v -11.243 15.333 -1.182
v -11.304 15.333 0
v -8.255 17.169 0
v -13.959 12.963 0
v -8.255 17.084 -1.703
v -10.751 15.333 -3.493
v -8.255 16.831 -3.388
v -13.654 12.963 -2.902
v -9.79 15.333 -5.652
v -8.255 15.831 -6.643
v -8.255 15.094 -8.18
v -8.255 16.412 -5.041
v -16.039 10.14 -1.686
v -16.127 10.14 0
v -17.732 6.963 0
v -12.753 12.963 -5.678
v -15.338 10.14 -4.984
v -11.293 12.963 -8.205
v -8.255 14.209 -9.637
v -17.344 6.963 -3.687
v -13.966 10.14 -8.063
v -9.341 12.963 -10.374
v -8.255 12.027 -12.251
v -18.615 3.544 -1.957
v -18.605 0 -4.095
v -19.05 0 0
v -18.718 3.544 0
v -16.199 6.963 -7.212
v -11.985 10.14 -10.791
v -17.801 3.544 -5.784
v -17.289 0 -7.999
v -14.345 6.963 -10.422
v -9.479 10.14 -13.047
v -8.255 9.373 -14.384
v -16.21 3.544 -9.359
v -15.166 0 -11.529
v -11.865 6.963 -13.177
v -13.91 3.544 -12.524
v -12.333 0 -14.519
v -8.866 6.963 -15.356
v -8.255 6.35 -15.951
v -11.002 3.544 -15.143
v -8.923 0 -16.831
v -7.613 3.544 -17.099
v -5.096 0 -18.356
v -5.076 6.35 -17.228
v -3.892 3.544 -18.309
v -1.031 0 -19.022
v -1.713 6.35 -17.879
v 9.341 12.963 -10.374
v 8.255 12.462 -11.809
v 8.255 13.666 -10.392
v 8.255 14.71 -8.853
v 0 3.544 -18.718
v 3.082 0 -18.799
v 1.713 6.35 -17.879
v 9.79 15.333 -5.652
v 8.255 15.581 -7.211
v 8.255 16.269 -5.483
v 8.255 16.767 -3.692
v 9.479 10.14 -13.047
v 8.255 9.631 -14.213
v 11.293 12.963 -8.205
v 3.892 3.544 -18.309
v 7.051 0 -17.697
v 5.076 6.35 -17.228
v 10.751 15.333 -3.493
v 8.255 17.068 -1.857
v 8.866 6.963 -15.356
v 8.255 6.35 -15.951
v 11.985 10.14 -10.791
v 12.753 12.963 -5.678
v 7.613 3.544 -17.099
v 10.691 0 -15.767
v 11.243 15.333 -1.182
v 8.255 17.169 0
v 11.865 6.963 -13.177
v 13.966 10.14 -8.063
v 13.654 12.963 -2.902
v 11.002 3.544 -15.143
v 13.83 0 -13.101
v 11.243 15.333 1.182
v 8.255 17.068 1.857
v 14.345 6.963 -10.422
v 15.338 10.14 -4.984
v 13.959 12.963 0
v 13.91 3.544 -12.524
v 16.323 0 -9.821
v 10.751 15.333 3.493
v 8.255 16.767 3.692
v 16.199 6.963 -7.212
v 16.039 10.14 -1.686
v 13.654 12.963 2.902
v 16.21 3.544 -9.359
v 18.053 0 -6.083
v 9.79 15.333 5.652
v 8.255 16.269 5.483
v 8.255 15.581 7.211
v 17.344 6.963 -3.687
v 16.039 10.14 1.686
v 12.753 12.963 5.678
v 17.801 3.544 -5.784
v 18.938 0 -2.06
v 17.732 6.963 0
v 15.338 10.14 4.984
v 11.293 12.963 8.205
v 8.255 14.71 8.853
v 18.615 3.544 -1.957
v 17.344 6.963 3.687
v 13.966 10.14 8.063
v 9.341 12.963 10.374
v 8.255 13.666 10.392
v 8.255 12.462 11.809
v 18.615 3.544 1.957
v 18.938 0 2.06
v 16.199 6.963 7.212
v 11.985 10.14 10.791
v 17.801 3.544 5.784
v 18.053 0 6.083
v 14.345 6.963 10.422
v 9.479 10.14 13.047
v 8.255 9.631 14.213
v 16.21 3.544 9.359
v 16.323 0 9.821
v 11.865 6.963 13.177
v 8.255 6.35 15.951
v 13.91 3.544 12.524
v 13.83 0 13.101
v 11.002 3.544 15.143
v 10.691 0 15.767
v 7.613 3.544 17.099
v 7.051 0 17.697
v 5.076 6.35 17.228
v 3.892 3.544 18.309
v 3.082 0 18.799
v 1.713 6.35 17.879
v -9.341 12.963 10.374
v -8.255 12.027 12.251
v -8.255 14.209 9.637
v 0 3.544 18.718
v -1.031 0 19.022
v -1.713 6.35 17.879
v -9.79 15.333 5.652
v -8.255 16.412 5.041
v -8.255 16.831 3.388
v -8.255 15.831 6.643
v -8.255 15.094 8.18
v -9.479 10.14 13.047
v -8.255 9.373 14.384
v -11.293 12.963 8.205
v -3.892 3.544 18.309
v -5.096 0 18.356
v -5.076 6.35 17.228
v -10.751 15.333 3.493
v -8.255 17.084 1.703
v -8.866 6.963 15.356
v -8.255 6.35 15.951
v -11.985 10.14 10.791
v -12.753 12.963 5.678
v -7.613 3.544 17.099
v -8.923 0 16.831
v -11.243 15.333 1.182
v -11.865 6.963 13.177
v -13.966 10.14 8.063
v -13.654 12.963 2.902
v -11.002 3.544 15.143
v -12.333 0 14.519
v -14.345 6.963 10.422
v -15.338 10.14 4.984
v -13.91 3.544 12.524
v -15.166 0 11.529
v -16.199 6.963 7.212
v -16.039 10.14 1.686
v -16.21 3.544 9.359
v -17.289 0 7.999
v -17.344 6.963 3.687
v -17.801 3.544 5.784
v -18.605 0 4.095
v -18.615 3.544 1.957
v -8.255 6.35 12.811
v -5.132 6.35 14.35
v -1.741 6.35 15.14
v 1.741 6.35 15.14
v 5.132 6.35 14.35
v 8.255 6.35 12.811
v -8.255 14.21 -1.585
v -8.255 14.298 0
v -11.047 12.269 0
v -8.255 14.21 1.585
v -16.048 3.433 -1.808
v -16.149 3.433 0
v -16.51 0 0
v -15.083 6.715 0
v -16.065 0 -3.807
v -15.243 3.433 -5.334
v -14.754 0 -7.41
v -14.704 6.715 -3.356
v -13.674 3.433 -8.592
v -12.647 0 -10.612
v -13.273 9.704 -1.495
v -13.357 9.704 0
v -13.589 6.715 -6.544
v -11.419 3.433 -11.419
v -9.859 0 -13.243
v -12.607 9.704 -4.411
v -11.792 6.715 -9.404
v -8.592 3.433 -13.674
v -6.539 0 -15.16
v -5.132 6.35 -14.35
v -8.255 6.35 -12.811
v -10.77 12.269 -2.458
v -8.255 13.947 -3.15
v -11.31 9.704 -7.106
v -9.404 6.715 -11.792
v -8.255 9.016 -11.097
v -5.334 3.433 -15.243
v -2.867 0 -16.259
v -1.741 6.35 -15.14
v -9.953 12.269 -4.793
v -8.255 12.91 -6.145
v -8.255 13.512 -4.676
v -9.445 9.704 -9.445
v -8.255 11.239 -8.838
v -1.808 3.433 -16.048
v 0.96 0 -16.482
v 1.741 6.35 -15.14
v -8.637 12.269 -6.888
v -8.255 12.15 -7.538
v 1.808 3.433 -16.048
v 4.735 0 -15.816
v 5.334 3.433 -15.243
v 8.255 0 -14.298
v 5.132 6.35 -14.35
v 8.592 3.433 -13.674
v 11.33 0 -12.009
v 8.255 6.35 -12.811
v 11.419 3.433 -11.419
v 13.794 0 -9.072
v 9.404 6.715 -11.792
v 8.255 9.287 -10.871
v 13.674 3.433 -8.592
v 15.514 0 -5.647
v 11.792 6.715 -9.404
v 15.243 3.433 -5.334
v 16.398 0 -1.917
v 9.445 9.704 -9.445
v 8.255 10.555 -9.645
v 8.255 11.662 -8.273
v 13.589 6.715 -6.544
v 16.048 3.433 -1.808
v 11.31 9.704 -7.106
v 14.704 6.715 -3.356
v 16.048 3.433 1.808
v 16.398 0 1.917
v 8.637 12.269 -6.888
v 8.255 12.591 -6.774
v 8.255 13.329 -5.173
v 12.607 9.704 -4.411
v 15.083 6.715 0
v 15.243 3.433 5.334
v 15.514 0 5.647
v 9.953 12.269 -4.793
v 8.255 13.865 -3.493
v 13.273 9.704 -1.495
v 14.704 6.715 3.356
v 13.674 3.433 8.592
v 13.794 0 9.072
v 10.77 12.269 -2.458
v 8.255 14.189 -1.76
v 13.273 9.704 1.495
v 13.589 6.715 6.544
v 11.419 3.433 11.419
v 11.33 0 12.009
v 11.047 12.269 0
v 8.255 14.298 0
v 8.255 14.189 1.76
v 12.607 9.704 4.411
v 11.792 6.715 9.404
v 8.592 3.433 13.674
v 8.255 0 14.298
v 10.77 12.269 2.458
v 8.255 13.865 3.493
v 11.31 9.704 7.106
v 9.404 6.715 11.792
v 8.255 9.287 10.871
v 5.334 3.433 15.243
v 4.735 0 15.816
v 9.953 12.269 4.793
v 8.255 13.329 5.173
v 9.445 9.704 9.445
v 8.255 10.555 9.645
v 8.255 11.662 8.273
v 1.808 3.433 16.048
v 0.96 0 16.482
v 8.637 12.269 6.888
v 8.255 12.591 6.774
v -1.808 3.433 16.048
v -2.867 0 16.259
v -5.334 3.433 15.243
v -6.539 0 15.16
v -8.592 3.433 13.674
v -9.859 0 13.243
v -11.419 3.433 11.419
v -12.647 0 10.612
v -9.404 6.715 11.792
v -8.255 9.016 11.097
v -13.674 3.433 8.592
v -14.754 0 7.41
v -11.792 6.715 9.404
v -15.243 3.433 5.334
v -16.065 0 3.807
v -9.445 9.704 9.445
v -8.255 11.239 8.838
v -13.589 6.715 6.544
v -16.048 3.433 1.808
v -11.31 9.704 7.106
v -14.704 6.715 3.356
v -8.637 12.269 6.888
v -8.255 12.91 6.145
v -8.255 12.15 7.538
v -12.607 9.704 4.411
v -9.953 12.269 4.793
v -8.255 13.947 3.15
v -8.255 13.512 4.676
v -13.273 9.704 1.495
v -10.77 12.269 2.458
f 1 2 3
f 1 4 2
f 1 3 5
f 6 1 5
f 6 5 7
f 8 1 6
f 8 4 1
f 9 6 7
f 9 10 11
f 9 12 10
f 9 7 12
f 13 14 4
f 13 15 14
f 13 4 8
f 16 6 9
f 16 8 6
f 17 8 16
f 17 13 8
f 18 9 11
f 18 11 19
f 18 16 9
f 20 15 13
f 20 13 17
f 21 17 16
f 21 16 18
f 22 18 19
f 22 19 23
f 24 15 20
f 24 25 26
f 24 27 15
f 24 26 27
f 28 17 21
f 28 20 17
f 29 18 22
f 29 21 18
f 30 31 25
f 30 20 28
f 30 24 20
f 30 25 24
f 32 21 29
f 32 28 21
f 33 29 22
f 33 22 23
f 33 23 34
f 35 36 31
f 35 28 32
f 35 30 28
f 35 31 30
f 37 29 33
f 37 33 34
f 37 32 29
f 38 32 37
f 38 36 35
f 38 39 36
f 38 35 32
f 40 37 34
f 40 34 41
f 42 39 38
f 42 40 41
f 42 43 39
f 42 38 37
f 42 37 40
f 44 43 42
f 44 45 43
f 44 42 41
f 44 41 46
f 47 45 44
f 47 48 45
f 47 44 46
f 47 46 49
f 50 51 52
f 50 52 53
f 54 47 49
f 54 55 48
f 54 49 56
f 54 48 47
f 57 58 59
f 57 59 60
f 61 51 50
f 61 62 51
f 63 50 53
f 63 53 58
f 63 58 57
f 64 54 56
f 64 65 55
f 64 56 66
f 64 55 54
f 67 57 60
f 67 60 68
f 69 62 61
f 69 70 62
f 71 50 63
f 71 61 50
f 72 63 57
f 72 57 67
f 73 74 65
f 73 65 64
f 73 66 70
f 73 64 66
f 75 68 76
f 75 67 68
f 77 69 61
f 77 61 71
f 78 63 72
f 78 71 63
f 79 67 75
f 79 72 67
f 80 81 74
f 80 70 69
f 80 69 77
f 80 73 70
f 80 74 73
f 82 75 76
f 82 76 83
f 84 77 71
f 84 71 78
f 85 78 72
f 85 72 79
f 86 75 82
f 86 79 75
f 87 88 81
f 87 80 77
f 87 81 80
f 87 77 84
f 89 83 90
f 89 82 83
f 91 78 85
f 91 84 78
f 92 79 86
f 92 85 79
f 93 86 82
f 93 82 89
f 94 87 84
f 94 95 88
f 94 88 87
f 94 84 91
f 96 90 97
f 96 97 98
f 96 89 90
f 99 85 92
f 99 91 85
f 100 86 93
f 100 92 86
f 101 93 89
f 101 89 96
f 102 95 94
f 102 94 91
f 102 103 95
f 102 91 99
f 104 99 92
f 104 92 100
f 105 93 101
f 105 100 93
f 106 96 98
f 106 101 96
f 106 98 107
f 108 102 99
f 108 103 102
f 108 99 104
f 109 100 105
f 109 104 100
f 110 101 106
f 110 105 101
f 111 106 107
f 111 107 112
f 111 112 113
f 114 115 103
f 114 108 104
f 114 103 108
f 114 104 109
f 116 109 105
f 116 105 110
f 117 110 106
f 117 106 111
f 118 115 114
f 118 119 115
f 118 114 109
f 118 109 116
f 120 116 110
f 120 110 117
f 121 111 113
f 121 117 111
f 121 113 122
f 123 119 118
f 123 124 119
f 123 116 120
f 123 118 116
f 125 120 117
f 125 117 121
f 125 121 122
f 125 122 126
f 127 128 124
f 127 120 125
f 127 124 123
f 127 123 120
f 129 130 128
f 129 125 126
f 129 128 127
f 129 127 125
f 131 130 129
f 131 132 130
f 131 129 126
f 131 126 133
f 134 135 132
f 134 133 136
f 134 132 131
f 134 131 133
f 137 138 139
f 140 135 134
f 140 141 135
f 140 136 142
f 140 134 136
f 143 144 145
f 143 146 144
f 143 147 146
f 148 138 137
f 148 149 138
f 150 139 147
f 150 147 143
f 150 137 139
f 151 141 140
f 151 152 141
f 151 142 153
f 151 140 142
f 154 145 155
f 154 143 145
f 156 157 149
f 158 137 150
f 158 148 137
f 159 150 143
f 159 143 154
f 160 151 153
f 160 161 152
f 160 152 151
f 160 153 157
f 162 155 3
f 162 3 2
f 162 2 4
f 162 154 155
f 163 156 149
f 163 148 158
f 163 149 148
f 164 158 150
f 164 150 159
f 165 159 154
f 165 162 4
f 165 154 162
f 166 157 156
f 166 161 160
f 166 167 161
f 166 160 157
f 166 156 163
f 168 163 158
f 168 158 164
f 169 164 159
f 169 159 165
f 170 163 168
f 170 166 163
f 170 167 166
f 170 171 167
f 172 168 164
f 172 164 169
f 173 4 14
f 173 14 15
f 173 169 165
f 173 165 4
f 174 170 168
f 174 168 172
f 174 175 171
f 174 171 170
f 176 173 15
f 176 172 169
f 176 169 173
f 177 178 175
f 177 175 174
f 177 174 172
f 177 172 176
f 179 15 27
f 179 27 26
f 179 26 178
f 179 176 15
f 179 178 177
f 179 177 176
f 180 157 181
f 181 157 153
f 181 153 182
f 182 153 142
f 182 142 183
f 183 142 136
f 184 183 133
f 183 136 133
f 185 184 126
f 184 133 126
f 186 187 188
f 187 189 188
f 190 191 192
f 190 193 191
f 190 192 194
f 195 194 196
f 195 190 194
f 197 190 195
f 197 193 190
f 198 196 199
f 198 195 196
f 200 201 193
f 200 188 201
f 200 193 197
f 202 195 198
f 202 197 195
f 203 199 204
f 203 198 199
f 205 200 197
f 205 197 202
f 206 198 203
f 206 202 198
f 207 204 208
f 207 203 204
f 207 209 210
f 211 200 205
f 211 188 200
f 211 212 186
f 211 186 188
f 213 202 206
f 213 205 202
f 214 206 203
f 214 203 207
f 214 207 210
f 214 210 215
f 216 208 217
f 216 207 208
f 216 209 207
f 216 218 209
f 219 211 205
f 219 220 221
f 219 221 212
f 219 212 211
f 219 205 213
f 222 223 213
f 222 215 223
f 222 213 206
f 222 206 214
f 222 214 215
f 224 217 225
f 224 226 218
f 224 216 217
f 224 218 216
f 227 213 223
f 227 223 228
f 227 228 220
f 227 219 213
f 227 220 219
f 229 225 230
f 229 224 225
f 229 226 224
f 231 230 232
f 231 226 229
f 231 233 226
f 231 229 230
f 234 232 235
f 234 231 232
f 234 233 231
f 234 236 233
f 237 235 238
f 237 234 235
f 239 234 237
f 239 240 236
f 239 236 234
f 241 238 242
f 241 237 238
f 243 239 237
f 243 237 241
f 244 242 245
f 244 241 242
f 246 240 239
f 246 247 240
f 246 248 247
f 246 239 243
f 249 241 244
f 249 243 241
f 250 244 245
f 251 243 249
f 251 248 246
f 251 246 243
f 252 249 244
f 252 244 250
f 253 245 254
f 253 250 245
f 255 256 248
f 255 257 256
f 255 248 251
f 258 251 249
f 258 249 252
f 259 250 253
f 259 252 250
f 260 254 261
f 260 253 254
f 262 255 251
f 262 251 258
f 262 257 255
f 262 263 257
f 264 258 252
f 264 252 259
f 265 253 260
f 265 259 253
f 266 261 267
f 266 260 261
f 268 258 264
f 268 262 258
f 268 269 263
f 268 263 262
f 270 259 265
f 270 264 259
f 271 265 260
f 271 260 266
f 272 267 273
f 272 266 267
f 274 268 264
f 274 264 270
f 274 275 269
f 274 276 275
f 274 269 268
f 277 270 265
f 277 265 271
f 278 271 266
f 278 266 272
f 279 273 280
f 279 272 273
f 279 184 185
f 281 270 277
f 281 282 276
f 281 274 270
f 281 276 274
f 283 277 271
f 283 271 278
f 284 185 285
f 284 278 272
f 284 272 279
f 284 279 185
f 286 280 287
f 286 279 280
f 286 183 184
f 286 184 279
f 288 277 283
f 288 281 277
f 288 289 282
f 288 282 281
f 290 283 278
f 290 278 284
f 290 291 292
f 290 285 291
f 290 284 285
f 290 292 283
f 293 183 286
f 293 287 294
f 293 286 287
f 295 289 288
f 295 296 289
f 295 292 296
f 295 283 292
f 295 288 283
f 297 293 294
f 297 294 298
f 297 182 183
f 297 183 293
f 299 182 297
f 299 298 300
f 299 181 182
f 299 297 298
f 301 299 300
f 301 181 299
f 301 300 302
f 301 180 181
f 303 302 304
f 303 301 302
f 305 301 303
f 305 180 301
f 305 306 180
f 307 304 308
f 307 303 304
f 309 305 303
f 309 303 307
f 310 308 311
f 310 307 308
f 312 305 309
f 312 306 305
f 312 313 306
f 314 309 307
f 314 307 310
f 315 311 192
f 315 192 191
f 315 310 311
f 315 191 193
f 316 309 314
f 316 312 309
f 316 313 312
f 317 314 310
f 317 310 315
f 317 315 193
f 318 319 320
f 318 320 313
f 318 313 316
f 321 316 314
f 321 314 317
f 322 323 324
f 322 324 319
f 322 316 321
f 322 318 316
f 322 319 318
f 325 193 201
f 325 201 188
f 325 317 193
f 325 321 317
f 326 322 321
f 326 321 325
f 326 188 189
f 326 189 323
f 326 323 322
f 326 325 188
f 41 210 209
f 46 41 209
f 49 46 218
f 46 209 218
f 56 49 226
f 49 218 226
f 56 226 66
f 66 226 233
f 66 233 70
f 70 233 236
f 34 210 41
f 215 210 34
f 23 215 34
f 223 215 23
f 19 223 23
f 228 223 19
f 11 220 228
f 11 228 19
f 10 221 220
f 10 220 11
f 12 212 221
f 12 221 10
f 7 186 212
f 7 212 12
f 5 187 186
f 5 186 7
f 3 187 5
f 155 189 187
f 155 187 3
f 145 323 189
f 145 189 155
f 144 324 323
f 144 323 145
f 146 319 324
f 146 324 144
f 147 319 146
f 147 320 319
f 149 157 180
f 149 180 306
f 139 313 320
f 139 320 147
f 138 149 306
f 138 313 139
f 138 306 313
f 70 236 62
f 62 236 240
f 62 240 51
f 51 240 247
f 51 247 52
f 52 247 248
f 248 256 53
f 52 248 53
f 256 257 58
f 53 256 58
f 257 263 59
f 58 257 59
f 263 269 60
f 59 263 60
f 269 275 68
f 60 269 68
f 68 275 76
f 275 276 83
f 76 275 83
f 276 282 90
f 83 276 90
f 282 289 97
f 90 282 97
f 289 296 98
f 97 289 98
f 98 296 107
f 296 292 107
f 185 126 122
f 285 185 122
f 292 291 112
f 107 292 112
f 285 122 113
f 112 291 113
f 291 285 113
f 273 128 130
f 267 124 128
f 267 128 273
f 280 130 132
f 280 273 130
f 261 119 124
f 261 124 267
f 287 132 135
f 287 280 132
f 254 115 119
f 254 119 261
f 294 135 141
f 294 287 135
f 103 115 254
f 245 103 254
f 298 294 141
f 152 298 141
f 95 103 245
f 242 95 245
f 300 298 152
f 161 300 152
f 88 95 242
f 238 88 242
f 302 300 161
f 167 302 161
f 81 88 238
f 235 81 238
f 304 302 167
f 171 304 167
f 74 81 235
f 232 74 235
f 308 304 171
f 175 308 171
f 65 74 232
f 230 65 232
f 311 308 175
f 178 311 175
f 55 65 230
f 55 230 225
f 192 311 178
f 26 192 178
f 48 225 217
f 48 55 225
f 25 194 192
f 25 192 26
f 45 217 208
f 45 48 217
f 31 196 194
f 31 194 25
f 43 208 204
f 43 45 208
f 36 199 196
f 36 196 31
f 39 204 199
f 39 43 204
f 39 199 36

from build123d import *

# Parameters (mm, degrees)
SKETCH2_W          = 16.51
SKETCH2_H          = 16.418842622
CUT_EXTRUDE1_DEPTH = 63.5


with BuildPart() as part:
    # Sketch1 → Revolve1 (revolve)
    with BuildSketch(Plane.XY, mode=Mode.PRIVATE) as revolve1_sk:
        with BuildLine():
            Line((19.05, 0), (16.51, 0))
            ThreePointArc((16.51, 0), (11.674332957, 11.674332957), (0, 16.51))
            Line((0, 16.51), (0, 19.05))
            ThreePointArc((0, 19.05), (13.470384182, 13.470384182), (19.05, 0))
        make_face()
    revolve(revolve1_sk.sketch.rotate(Axis((0, 19.05, 0), (0, -1, 0)), 180), axis=Axis((0, 19.05, 0), (0, -1, 0)))

    # Sketch2 → Cut-Extrude1 (cut, symmetric)
    with BuildSketch(Plane.XY):
        with Locations((0, 14.559421311)):
            Rectangle(SKETCH2_W, SKETCH2_H)
    extrude(amount=CUT_EXTRUDE1_DEPTH, both=True, mode=Mode.SUBTRACT)


solid = part.part
